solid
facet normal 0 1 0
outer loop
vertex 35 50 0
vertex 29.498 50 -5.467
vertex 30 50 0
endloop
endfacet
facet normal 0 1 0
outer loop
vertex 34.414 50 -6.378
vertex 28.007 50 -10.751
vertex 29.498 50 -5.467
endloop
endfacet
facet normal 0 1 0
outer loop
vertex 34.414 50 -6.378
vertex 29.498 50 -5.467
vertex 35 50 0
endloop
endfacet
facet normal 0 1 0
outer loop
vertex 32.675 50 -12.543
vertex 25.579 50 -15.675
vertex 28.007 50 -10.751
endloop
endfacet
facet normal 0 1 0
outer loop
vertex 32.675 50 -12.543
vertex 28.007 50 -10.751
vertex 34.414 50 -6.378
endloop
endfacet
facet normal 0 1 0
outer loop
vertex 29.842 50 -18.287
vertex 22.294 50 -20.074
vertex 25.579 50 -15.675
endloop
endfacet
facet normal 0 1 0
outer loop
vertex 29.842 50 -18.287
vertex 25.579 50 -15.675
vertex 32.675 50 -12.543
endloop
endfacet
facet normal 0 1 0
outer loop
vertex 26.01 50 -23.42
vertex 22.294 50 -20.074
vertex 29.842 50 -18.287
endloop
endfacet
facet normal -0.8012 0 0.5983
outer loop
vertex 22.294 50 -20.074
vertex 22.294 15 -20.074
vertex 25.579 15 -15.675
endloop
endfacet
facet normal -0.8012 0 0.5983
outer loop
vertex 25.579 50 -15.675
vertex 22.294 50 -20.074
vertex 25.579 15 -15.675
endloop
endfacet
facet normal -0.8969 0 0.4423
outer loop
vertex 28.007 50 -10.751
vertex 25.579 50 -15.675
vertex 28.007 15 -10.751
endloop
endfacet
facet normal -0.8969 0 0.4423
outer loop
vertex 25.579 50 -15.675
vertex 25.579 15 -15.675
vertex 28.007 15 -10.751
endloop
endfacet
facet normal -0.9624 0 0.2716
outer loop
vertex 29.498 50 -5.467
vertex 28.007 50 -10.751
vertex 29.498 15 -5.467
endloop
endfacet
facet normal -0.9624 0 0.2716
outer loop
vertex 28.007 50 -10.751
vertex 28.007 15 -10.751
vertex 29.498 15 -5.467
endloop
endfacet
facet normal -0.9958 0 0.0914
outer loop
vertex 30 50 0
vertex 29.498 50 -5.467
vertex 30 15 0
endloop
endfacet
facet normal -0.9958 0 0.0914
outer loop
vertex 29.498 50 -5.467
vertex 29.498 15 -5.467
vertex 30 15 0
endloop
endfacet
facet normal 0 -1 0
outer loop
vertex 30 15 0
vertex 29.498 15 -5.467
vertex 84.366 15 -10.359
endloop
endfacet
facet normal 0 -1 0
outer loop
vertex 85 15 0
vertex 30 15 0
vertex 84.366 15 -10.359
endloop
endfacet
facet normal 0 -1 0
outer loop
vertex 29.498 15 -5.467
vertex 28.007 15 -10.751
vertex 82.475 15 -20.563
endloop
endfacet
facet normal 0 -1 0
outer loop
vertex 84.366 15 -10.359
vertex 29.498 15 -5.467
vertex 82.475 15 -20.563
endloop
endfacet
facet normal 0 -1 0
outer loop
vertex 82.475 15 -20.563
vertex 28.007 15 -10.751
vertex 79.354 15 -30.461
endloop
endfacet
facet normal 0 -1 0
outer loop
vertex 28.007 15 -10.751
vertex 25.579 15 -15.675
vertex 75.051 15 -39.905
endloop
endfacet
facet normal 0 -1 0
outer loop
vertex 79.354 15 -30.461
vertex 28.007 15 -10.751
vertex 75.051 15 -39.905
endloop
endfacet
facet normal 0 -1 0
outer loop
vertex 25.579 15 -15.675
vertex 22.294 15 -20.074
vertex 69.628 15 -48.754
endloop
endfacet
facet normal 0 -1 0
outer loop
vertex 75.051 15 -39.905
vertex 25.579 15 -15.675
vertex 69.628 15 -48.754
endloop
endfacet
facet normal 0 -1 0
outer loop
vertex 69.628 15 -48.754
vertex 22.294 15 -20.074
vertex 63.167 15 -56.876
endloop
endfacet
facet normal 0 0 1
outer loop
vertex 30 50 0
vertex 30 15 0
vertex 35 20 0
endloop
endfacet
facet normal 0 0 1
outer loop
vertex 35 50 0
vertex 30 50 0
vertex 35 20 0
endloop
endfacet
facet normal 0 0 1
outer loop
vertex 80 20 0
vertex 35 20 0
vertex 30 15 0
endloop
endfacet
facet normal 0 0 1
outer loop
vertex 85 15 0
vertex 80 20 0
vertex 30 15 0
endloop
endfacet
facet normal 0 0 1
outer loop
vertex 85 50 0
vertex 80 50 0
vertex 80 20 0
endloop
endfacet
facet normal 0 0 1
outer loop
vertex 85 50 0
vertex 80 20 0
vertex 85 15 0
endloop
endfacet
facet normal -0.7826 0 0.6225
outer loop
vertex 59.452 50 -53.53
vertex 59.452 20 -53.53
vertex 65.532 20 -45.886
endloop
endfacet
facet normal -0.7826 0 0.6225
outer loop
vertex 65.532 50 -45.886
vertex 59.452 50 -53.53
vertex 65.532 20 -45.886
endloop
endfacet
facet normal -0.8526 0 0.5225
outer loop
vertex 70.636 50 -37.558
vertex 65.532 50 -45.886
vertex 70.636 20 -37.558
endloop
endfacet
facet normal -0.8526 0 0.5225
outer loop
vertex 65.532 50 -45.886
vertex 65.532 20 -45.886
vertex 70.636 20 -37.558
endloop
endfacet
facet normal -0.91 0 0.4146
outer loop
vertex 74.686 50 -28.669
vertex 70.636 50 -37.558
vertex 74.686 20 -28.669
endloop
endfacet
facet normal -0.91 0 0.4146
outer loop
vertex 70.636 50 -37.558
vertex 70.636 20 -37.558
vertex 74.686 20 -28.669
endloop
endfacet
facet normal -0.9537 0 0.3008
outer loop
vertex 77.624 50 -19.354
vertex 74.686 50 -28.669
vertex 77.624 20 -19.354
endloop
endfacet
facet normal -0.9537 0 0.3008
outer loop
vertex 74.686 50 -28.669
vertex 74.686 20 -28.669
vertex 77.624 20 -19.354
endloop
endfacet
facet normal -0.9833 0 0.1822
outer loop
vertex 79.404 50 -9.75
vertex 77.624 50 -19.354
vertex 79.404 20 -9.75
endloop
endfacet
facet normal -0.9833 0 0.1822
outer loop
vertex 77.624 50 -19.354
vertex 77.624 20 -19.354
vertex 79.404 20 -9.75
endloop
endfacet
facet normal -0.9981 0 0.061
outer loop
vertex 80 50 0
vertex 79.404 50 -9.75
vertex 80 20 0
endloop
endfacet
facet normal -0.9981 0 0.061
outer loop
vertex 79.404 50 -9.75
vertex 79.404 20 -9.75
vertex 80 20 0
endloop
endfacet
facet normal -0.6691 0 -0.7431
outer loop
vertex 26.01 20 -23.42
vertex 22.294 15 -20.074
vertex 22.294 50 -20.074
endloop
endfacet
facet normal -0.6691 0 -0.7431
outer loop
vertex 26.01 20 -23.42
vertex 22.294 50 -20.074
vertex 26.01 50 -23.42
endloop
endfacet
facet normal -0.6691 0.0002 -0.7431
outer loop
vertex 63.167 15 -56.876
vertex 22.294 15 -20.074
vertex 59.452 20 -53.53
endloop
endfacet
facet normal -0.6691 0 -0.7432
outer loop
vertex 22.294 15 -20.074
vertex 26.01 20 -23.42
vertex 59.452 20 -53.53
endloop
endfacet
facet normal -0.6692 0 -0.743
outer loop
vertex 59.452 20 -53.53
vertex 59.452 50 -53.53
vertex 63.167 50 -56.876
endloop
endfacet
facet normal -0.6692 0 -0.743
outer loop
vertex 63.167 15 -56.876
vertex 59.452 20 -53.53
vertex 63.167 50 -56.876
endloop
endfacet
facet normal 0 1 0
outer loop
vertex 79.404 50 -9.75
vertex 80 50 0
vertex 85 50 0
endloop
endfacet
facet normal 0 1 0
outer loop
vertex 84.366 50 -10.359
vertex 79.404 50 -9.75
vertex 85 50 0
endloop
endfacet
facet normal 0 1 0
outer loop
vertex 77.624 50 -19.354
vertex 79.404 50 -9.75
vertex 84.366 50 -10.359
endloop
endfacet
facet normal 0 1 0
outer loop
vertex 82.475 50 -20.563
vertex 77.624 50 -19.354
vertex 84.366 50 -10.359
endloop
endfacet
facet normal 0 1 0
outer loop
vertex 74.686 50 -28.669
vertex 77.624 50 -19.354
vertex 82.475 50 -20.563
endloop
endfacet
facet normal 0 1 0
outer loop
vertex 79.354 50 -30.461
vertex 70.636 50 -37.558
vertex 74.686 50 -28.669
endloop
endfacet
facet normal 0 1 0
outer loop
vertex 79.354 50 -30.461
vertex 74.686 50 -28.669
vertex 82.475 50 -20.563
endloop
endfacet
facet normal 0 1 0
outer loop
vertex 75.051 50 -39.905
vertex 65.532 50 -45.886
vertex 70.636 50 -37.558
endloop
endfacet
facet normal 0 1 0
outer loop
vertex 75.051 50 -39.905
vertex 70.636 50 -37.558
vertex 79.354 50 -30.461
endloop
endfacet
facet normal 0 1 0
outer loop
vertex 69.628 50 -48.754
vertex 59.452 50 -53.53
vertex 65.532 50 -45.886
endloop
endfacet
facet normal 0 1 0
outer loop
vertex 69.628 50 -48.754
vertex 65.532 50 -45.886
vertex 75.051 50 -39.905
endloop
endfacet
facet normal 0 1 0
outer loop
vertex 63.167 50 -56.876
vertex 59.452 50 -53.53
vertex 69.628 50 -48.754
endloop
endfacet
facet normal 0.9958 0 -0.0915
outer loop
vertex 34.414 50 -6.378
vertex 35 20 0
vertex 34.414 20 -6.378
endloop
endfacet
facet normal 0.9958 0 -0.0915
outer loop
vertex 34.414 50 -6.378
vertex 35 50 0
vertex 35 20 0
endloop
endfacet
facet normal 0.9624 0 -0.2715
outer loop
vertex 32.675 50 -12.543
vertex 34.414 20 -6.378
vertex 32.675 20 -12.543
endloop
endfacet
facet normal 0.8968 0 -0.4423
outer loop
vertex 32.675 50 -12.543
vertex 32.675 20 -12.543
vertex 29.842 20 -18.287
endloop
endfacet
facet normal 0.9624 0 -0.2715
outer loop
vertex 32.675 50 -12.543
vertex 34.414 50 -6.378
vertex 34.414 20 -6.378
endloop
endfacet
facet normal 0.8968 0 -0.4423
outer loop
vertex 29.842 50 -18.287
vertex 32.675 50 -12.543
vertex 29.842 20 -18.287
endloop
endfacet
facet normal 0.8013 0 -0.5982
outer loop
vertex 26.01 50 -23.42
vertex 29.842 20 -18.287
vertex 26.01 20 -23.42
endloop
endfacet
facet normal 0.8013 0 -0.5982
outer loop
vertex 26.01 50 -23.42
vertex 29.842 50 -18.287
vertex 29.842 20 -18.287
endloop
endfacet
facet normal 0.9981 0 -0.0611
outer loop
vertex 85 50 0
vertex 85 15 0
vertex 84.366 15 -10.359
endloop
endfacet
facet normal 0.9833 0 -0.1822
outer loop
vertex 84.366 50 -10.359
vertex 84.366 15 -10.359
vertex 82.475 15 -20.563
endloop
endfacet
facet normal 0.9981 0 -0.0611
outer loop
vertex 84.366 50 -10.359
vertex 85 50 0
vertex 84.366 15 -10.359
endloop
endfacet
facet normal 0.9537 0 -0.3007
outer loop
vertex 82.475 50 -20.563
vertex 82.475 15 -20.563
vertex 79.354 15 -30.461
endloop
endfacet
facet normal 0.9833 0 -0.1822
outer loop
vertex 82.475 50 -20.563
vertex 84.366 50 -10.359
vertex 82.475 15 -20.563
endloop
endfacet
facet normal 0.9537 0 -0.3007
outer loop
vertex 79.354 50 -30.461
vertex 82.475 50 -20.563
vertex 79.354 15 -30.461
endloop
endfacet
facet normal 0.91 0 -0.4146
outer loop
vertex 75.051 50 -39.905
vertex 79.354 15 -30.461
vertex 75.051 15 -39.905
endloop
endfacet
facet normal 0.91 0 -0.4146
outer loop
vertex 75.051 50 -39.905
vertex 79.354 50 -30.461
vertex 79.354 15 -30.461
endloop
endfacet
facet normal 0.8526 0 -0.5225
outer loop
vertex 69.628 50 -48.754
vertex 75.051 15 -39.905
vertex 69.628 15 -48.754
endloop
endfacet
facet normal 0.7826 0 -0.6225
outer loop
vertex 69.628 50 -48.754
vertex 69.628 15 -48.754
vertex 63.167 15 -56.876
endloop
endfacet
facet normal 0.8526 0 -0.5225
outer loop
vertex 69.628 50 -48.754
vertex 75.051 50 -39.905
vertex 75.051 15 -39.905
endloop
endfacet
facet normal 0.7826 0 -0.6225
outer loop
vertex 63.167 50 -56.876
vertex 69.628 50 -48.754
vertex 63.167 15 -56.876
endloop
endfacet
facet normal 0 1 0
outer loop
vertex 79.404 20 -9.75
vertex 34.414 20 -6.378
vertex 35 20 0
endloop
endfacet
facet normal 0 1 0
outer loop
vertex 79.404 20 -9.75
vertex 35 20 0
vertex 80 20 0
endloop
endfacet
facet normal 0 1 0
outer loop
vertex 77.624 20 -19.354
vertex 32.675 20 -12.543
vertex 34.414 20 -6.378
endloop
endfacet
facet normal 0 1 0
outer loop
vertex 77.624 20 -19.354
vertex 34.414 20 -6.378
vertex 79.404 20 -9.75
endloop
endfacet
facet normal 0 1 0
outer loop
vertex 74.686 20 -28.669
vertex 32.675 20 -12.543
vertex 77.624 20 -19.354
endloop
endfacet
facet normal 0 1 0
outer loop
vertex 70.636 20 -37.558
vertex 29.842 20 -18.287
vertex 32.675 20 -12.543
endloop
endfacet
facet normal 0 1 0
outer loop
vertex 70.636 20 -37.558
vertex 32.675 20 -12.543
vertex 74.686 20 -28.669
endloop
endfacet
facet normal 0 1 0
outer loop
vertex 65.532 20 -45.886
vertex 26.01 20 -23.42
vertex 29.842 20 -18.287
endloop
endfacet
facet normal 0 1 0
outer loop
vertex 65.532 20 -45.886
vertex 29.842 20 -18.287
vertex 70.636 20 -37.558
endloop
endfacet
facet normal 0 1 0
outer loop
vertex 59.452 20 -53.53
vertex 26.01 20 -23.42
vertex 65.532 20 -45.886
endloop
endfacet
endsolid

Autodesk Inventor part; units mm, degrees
ref_plane "YZ Plane" through (0, 0, 0) normal (1, 0, 0) x (0, 1, 0)
ref_plane "XZ Plane" through (0, 0, 0) normal (0, 1, 0) x (-1, 0, 0)
ref_plane "XY Plane" through (0, 0, 0) normal (0, 0, 1) x (1, 0, 0)
sketch "Sketch1" plane through (0, 0, 0) normal (0, 0, 1) x (1, 0, 0)
  line L0 (0, 0) -> (0, 50) construction
  line L1 (0, 50) -> (30, 50) construction
  line L2 (30, 50) -> (30, 15)
  line L3 (30, 15) -> (85, 15)
  line L4 (85, 15) -> (85, 50)
  line L5 (85, 50) -> (80, 50)
  line L6 (80, 50) -> (80, 20)
  line L7 (80, 20) -> (35, 20)
  line L8 (35, 20) -> (35, 50)
  line L9 (35, 50) -> (30, 50)
  dimension "d0" = 50
  dimension "d1" = 30
  dimension "d2" = 35
  dimension "d3" = 55
  dimension "d4" = 35
  dimension "d5" = 5
  dimension "d6" = 30
  dimension "d7" = 45
revolve "Revolution1" add sketch "Sketch1" angle 42 about axis through (0, 0, 0) along (0, 1, 0)
properties part number "track z2059"
